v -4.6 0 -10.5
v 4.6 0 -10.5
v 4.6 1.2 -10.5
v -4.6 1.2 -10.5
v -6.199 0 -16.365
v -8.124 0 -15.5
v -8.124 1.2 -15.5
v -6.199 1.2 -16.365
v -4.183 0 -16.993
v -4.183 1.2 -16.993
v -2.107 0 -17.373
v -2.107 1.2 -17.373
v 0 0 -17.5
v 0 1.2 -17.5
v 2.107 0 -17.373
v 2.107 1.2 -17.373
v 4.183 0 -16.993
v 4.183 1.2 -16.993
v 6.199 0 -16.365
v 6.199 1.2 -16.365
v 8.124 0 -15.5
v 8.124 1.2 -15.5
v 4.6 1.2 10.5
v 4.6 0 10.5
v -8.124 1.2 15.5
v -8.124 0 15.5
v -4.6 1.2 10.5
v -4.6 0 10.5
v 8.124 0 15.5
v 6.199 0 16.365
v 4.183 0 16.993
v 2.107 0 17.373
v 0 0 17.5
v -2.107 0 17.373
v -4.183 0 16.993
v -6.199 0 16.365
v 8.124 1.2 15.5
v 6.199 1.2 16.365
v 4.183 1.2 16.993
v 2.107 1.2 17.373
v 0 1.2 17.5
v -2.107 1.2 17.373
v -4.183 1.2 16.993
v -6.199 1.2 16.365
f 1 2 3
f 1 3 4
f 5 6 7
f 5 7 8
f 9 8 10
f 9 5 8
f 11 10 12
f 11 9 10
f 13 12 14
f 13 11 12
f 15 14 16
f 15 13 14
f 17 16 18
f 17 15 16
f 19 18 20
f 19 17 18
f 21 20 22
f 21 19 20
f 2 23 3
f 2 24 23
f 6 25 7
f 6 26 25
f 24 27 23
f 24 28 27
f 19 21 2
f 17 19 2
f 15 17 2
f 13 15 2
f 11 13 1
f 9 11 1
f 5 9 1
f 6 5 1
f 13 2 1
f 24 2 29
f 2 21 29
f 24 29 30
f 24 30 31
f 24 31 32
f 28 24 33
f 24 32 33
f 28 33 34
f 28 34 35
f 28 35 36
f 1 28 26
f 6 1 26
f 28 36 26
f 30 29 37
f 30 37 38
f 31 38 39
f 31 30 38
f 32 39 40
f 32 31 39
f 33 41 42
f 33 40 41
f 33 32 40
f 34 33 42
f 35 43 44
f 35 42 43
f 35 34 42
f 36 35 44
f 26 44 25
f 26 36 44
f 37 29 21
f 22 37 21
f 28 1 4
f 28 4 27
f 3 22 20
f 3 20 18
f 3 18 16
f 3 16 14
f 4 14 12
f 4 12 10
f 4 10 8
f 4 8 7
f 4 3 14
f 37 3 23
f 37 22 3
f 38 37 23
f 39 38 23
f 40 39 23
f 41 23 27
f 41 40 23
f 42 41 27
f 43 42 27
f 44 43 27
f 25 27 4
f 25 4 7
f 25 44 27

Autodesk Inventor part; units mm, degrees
ref_plane "YZ Plane" through (0, 0, 0) normal (1, 0, 0) x (0, 1, 0)
ref_plane "XZ Plane" through (0, 0, 0) normal (0, 1, 0) x (-1, 0, 0)
ref_plane "XY Plane" through (0, 0, 0) normal (0, 0, 1) x (1, 0, 0)
sketch "スケッチ1" plane through (0, 0, 0) normal (0, 1, 0) x (-1, 0, 0)
  circle A0 centre (0, 0) radius 17.5
  line L0 (8.124, 15.5) -> (8.124, -15.5)
  line L1 (-8.124, 15.5) -> (-8.124, -15.5)
  line L2 (4.6, 10.5) -> (-4.6, 10.5)
  line L3 (-4.6, 10.5) -> (-4.6, -10.5)
  line L4 (-4.6, -10.5) -> (4.6, -10.5)
  line L5 (4.6, -10.5) -> (4.6, 10.5)
  point P0 (4.6, 0)
  point P1 (0, 10.5)
  dimension "d0" = 35
  dimension "d1" = 31
  dimension "d2" = 9.2
  dimension "d3" = 21
extrude "押し出し1" add sketch "スケッチ1" along normal blind 1.2 contours L0 A0 L1
properties part number "ServoMotor_Holder"
